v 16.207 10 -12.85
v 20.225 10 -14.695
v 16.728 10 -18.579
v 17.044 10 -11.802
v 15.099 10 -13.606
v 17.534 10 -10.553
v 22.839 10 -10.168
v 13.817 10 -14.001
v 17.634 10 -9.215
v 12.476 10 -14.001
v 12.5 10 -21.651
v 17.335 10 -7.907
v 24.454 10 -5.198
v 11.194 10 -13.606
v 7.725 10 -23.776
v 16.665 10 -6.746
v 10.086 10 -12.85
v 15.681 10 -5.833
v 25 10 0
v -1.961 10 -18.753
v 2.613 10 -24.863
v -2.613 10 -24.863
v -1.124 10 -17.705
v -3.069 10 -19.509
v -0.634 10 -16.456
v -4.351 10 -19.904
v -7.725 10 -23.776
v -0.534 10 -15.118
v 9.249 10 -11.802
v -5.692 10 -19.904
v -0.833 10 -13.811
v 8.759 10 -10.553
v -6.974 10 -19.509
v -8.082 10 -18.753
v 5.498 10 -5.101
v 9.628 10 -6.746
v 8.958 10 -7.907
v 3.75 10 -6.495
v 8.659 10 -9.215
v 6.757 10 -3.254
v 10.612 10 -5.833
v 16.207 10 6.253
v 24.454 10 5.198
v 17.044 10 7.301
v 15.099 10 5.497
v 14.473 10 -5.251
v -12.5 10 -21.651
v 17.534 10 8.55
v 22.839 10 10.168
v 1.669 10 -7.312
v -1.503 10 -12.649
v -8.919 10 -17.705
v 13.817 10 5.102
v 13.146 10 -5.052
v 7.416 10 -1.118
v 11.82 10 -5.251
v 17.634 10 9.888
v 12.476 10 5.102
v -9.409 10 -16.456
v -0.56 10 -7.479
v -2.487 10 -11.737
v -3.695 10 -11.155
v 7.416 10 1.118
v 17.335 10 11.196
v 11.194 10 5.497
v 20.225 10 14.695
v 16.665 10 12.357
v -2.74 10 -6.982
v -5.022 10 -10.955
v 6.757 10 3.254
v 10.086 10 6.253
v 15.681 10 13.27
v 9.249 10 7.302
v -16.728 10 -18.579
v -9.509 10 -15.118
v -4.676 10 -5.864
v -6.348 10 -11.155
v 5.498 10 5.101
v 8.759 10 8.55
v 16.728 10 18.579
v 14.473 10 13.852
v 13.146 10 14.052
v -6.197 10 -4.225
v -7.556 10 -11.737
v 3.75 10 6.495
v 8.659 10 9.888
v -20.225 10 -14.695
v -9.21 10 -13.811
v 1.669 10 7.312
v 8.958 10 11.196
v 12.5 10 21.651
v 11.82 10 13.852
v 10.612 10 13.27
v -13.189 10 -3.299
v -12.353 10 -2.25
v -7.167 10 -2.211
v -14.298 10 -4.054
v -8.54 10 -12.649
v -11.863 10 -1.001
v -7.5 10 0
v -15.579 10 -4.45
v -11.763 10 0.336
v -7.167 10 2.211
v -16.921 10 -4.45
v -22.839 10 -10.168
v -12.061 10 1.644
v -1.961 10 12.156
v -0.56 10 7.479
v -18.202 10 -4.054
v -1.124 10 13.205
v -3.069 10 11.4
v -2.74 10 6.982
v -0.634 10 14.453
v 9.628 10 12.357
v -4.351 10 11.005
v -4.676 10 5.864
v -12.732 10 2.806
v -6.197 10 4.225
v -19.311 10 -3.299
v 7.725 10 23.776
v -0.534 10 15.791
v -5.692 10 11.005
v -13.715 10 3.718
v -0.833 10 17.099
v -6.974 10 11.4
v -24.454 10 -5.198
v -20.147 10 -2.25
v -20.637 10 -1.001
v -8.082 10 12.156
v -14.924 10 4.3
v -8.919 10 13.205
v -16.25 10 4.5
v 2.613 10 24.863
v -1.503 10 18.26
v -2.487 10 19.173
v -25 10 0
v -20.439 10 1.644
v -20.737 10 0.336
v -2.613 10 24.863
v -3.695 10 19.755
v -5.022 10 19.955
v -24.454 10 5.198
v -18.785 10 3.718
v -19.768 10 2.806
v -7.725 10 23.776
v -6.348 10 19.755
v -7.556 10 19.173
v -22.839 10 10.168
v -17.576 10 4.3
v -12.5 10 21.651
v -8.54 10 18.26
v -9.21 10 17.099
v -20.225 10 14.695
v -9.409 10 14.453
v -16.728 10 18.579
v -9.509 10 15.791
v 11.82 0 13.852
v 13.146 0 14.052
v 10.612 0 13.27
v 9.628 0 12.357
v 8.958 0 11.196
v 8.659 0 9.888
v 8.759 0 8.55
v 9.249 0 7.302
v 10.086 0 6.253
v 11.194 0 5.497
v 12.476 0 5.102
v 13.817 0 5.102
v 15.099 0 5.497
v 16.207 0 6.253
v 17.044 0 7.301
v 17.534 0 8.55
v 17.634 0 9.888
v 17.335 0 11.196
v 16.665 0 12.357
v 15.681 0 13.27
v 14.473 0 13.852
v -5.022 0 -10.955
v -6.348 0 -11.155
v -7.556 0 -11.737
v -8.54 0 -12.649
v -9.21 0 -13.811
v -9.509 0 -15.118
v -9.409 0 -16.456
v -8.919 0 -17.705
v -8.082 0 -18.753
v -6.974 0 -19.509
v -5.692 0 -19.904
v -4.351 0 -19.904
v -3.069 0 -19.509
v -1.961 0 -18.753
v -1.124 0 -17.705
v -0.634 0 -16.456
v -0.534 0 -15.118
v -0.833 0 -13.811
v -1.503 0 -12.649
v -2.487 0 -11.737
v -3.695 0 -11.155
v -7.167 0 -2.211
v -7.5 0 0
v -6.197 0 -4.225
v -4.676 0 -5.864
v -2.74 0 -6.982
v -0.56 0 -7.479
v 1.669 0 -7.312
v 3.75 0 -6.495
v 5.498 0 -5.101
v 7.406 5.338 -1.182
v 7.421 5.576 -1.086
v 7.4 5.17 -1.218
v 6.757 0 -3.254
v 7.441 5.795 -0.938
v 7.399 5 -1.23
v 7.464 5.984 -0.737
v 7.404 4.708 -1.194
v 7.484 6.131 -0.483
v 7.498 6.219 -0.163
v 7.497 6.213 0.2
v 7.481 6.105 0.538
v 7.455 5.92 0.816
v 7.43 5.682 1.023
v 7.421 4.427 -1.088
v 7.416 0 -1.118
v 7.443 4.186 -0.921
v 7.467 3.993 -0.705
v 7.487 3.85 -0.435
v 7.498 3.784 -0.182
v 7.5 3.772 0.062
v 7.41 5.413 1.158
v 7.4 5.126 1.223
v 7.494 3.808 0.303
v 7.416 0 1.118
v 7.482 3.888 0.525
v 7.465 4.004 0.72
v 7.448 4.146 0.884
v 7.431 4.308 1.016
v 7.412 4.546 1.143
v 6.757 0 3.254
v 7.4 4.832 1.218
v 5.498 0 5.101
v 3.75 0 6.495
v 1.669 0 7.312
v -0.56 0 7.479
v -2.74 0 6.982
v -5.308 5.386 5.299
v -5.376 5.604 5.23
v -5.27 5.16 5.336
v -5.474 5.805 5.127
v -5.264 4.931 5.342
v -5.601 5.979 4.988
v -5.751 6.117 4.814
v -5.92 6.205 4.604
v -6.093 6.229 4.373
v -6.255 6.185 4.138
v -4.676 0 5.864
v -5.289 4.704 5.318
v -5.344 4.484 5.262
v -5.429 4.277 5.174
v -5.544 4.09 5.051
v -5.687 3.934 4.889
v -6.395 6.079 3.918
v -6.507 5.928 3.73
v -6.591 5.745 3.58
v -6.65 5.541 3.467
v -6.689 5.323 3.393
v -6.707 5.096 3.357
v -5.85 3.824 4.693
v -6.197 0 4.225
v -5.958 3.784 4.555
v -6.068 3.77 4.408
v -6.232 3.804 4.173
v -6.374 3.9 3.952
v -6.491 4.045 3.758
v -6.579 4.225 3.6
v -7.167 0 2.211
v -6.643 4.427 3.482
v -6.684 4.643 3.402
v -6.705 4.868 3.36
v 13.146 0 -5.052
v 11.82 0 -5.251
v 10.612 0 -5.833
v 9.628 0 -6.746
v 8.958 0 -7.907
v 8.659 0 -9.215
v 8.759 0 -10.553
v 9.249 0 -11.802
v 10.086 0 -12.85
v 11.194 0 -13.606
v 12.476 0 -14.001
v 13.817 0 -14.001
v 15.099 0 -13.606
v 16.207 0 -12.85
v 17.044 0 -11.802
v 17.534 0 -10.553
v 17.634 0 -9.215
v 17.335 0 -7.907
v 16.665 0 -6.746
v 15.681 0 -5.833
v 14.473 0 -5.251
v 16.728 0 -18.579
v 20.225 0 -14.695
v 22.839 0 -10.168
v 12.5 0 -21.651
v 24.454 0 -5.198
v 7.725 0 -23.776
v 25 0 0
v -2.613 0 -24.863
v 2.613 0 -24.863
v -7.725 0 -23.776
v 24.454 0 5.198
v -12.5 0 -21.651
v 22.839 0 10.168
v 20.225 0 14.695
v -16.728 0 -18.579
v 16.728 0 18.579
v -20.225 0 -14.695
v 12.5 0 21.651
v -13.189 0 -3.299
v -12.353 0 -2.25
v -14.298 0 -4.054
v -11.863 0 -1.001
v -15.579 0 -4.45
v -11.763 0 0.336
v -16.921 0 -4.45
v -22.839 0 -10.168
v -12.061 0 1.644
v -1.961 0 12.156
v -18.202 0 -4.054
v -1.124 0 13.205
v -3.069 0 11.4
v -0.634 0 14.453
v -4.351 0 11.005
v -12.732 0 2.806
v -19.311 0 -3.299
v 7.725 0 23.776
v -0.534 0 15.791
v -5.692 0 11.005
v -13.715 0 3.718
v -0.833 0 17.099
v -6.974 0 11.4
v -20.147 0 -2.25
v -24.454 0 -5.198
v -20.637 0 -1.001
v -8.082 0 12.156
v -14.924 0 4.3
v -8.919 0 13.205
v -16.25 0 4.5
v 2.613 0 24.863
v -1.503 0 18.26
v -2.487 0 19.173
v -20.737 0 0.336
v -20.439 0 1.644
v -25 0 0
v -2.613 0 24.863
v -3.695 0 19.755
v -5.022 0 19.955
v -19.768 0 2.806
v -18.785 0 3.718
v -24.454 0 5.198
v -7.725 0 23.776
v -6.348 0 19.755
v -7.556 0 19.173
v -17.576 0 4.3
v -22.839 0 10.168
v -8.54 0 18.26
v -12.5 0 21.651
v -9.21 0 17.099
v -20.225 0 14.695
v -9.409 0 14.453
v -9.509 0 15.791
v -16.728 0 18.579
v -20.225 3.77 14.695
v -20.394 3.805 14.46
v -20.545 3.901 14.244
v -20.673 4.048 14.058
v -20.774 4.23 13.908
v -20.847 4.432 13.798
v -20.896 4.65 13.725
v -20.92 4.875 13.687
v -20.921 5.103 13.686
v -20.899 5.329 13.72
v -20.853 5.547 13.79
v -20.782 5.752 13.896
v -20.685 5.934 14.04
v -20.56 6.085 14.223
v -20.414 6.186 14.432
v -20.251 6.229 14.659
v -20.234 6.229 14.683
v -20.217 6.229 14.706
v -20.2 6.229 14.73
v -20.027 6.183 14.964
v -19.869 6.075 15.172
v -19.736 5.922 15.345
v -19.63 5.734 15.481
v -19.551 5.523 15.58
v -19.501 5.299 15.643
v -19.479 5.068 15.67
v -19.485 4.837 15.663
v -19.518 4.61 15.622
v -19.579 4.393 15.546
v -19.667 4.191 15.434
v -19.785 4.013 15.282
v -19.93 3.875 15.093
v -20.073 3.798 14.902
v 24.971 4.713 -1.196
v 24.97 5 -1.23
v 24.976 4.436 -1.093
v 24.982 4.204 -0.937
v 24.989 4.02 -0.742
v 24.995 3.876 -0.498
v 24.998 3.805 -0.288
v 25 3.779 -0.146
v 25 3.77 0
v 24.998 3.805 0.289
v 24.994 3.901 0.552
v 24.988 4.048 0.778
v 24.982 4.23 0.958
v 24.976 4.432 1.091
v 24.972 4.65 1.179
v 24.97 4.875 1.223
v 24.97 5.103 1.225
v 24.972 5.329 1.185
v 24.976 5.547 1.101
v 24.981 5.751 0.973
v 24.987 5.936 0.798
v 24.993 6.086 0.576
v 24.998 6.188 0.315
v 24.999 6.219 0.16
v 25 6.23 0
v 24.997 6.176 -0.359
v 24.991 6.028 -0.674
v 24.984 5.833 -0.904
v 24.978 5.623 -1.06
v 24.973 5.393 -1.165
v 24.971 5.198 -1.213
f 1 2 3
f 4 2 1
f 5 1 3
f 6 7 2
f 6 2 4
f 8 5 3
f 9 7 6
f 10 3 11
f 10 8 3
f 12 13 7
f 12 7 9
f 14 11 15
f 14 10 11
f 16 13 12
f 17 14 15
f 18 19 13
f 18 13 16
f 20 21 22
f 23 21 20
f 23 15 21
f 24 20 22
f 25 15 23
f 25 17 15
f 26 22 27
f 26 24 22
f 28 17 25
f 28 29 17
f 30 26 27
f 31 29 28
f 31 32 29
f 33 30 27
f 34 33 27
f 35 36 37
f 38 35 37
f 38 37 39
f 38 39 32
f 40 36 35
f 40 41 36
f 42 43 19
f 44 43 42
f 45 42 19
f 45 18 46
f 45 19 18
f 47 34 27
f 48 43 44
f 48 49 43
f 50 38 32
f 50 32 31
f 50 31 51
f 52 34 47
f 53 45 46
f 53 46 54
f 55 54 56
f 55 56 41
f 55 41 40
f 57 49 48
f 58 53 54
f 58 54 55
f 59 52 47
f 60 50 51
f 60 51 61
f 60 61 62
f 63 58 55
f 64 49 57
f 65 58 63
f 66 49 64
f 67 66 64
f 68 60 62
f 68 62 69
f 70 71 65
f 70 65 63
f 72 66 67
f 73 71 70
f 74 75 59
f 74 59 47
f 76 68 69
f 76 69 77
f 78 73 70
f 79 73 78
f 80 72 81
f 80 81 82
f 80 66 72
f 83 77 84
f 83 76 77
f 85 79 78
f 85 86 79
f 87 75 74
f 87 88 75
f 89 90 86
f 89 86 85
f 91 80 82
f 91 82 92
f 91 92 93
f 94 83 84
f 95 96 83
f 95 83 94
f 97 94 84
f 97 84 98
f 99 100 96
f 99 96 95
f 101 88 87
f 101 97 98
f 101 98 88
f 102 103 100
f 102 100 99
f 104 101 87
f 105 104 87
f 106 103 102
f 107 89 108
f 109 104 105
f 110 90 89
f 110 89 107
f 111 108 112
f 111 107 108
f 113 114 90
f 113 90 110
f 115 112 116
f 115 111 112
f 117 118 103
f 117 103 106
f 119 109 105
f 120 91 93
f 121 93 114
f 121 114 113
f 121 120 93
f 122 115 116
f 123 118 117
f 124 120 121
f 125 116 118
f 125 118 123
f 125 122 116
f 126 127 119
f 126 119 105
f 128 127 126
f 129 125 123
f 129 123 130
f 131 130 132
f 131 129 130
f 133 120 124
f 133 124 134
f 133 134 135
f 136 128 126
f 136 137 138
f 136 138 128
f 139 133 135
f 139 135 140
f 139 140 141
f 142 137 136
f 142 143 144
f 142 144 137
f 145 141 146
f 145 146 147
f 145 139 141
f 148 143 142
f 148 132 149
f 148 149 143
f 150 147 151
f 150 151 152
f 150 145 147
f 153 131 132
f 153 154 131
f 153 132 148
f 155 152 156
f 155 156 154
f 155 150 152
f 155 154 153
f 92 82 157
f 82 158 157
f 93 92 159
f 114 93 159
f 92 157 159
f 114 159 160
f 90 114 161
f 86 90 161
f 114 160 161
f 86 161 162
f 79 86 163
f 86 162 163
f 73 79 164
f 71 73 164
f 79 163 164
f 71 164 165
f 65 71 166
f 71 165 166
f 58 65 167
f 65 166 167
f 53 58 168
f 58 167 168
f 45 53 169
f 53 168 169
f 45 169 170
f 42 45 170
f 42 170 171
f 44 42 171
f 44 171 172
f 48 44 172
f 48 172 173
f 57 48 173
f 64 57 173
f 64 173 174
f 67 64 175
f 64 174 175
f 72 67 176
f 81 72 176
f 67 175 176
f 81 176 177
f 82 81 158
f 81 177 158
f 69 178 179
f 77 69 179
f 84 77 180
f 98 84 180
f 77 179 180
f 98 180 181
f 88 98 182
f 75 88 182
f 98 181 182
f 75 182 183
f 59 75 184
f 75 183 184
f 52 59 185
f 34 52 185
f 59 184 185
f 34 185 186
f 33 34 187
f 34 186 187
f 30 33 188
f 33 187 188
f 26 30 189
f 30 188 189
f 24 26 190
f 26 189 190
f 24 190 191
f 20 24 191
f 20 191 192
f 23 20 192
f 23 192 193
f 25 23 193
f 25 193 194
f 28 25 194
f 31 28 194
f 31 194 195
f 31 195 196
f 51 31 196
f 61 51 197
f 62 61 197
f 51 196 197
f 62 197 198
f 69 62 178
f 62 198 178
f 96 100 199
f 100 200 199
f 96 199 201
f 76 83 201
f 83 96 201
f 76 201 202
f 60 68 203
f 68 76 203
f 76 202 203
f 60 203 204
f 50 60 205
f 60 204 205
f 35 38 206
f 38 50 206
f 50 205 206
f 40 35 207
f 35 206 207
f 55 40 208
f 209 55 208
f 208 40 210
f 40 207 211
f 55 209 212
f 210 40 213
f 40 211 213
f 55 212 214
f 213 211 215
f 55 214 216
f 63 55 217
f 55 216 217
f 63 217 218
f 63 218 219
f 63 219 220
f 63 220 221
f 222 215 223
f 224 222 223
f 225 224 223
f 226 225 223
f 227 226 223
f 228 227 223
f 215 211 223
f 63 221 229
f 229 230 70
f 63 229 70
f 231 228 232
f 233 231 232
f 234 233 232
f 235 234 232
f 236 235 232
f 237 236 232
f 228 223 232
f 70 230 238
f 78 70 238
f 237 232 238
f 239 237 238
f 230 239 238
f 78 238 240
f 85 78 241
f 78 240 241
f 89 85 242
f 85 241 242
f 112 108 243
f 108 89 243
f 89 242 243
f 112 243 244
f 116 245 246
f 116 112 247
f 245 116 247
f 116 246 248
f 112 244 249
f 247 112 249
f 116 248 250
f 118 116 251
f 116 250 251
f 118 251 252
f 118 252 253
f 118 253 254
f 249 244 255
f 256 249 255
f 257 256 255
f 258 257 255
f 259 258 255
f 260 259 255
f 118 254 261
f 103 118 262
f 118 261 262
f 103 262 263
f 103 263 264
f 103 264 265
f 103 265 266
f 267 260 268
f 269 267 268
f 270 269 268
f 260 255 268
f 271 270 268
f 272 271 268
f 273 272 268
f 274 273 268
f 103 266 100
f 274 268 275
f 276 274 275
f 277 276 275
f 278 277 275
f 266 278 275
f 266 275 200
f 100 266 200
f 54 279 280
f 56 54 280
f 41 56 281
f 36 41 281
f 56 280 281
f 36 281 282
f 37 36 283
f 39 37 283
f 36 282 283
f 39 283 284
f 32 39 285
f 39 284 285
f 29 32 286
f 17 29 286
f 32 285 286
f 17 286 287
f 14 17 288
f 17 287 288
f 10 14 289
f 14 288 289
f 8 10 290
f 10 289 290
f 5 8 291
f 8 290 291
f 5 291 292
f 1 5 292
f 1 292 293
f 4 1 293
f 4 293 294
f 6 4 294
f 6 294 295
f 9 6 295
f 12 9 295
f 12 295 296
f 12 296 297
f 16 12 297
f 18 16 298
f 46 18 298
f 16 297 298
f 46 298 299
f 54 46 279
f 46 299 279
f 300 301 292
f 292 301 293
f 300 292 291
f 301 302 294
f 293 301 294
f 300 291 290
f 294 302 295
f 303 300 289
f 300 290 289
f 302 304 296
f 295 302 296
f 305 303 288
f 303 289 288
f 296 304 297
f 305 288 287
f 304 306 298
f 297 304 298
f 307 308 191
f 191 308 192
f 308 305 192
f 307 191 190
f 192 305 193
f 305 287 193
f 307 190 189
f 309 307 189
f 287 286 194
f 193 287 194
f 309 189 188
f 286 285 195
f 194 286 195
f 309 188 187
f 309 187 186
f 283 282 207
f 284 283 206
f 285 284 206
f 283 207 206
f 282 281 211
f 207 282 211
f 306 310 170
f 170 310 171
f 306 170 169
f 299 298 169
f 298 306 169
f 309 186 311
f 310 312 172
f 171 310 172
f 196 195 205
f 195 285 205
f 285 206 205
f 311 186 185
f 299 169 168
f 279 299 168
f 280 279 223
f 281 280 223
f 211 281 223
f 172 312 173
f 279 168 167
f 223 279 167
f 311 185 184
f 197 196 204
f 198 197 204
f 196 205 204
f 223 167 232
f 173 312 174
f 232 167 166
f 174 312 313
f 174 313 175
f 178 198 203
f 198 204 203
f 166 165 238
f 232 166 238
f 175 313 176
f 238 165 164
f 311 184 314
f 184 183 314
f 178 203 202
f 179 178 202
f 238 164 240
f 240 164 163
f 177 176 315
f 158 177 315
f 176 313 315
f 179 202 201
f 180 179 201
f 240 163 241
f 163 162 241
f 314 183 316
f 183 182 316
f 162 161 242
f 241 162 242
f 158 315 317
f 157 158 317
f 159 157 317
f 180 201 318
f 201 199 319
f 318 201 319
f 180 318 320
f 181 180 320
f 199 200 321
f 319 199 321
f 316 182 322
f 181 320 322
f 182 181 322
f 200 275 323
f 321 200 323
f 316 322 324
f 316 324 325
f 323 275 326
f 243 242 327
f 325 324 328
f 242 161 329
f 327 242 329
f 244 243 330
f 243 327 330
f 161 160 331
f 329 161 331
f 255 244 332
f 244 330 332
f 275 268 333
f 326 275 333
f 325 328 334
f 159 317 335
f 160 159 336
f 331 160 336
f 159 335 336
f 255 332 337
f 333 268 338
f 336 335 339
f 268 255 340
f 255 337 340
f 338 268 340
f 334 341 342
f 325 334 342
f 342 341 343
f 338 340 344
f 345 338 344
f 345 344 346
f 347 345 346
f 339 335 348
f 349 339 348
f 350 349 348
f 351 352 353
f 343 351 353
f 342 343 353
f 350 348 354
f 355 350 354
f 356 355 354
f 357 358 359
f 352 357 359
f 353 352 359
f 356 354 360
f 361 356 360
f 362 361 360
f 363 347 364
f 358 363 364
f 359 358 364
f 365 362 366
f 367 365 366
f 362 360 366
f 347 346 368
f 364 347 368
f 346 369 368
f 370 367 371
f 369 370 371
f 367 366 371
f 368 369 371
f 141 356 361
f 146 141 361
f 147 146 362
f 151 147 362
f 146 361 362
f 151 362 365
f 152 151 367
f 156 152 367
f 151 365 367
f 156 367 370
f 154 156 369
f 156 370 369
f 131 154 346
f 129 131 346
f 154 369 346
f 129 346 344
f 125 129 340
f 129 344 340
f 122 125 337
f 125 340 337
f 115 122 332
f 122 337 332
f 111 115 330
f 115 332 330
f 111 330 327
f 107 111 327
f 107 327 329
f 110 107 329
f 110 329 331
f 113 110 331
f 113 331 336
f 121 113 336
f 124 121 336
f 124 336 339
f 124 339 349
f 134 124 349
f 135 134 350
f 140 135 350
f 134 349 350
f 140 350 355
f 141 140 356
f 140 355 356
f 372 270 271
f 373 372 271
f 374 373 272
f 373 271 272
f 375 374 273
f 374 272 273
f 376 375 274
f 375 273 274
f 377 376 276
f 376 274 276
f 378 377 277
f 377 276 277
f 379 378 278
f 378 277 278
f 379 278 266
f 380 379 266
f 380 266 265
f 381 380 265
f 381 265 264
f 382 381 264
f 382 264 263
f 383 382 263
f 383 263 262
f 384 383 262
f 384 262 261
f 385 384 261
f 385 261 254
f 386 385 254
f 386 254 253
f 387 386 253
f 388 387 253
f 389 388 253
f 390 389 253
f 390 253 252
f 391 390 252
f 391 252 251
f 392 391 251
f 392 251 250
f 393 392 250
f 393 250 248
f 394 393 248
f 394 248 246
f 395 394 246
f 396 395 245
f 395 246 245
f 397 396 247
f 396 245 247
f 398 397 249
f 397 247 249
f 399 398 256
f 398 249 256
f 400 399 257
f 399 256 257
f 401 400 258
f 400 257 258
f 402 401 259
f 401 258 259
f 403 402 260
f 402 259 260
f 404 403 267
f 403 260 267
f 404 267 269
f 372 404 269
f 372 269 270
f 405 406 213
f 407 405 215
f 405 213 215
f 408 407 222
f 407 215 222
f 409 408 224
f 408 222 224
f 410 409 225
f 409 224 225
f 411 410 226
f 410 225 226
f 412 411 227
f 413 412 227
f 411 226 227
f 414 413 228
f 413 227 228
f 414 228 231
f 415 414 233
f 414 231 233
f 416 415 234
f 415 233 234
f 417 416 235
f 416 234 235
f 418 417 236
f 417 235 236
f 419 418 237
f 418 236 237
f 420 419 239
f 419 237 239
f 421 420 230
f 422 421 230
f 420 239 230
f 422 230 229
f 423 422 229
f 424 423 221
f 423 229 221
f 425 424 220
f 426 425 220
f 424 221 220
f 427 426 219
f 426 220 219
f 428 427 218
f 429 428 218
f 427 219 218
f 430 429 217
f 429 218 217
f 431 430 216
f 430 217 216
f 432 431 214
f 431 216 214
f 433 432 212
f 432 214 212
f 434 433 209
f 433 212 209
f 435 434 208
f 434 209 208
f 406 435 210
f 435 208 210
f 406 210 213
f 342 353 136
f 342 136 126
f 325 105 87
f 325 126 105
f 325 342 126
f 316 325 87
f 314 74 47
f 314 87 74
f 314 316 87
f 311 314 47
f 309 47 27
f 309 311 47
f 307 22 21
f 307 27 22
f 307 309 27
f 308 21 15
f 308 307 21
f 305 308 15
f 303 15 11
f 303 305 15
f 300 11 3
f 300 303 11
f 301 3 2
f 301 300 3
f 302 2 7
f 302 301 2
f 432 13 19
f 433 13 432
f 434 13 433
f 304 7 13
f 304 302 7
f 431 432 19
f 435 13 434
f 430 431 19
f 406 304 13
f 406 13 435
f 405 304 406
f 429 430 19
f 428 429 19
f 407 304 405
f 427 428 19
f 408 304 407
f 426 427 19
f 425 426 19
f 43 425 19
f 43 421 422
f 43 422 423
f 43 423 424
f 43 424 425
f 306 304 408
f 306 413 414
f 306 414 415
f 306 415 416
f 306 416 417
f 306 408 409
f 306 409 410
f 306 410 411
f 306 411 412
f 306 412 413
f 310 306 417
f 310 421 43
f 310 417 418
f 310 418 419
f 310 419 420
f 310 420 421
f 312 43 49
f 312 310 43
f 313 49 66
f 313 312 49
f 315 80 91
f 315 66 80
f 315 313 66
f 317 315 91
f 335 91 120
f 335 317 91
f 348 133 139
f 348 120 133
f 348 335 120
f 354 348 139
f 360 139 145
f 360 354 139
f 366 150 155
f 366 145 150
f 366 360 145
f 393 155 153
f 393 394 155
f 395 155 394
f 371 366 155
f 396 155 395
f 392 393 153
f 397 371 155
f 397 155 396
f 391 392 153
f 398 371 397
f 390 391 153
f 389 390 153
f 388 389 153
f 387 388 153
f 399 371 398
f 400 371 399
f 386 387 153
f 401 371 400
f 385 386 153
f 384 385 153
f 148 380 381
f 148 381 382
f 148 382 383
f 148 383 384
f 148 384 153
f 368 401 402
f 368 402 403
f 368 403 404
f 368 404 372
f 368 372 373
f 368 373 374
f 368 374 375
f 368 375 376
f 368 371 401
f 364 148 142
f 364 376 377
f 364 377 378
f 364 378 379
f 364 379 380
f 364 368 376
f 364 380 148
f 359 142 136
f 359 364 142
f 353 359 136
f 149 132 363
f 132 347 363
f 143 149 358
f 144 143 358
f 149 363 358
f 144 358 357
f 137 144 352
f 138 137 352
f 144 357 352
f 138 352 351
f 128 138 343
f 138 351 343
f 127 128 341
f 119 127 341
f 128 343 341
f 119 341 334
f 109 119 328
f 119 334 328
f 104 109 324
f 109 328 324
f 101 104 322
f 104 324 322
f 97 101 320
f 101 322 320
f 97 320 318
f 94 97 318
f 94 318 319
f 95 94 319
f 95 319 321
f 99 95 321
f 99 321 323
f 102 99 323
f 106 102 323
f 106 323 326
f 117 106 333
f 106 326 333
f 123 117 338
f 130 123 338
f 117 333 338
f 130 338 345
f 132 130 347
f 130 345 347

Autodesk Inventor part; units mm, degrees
ref_plane "YZ Plane" through (0, 0, 0) normal (1, 0, 0) x (0, 1, 0)
sketch "Skizze1" plane through (0, 0, 0) normal (0, 1, 0) x (-1, 0, 0)
  circle A0 centre (0, 0) radius 7.5
  circle A1 centre (0, 0) radius 25
  dimension "d0" = 15
  dimension "d1" = 50
extrude "Extrusion1" add sketch "Skizze1" along normal blind 10
sketch "Skizze2" plane through (0, 10, 0) normal (0, 1, 0) x (1, 0, 0)
  circle A0 centre (0, 0) radius 25 projected
  line L0 (-25, 0) -> (-16.25, 0)
  line L1 (0, 0) -> (8.75, 0) construction
  line L2 (0, 0) -> (-5.0215, 15.4547)
  line L3 (0, 0) -> (16.25, 0) construction
  line L4 (0, 0) -> (13.1465, 9.5515)
  line L5 (0, 0) -> (16.25, 0) construction
  line L6 (0, 0) -> (16.25, 0) construction
  line L7 (0, 0) -> (13.1465, -9.5515)
  line L8 (0, 0) -> (16.25, 0) construction
  line L9 (0, 0) -> (-5.0215, -15.4547)
  line L10 (0, 0) -> (16.25, 0) construction
  circle A1 centre (-16.25, 0) radius 4.3
  circle A2 centre (-5.0215, 15.4547) radius 4.3
  circle A3 centre (13.1465, 9.5515) radius 4.3
  circle A4 centre (13.1465, -9.5515) radius 4.3
  circle A5 centre (-5.0215, -15.4547) radius 4.3
  dimension "d4" = 8.75
  dimension "d9" = 16.25
  dimension "d10" = 108
  dimension "d11" = 16.25
  dimension "d12" = 36
  dimension "d15" = 16.25
  dimension "d16" = 36
  dimension "d17" = 16.25
  dimension "d18" = 108
  dimension "d19" = 8.6
  dimension "d20" = 8.6
  dimension "d21" = 8.6
  dimension "d22" = 8.6
  dimension "d23" = 8.6
hole "Bohrung1" at (-16.25, 10, 0) at (-5.0215, 10, -15.4547) at (13.1465, 10, -9.5515) at (13.1465, 10, 9.5515) at (-5.0215, 10, 15.4547) direction (0, -1, 0) diameter 9 end through all
sketch "Skizze3" plane through (0, 0, 0) normal (1, 0, 0) x (0, 1, 0)
  point P0 (0, 0)
sketch "Skizze4" plane through (0, 0, 0) normal (1, 0, 0) x (0, 1, 0)
  line L0 (0, 0) -> (5, 0)
sketch "Skizze6" plane through (0, 10, 0) normal (0, 1, 0) x (1, 0, 0)
  circle A0 centre (-5.0215, -15.4547) radius 4.5 projected
  circle A1 centre (-16.25, 0) radius 4.5 projected
  circle A2 centre (0, 0) radius 25 projected
  line L0 (0, 0) -> (-8.7488, -12.9333)
  line L1 (0, 0) -> (-15.0038, -4.324)
  line L2 (-11.8428, -8.6043) -> (-20.2254, -14.6946)
  line L3 (-11.8428, -8.6043) -> (-1.4813, -8.6043) construction
  line L4 (0, 0) -> (-11.8428, -8.6043)
  dimension "d36" = 5.321
  dimension "d37" = 144
sketch "Skizze7" plane through (0, 0, 0) normal (0, -1, 0) x (1, 0, 0)
  line L0 (0, 0) -> (-20.2254, 14.6946)
  circle A0 centre (0, 0) radius 25 projected
  line L1 (0, 0) -> (25, 0) construction
  line L2 (-20.2254, 14.6946) -> (44.6167, -28.5072)
  dimension "d38" = 144
ref_plane "Arbeitsebene1" through (-20.2254, 10, 14.6946) normal (-0.809017, 0, 0.5877853) x (0, -1, 0)
sketch "Skizze8" plane through (-20.2254, 10, 14.6946) normal (-0.809017, 0, 0.5877853) x (0, -1, 0)
  line L0 (10, 0) -> (5, 0)
  dimension "d39" = 5
hole "Bohrung2" at (-20.2254, 5, 14.6946) direction (0.809017, 0, -0.5877853) diameter 2.459 depth 27.8 tip angle 118 thread size "M3x0.5" class "6H" standard "ISO Metric profile"
sketch "Skizze9" plane through (0, 0, 0) normal (0, -1, 0) x (1, 0, 0)
  line L0 (0, 0) -> (25, 0)
  circle A0 centre (0, 0) radius 25 projected
  line L1 (0, 0) -> (14.68, 5.3208)
  circle A1 centre (13.1465, 9.5515) radius 4.5 projected
  line L2 (0, 0) -> (14.68, -5.3208)
  circle A2 centre (13.1465, -9.5515) radius 4.5 projected
  line L3 (0, 0) -> (25, 0)
sketch "Skizze10" plane through (0, 10, 0) normal (0, 1, 0) x (1, 0, 0)
  line L0 (0, 0) -> (25, 0)
  circle A0 centre (0, 0) radius 25 projected
ref_plane "Arbeitsebene2" through (25, 0, 0) normal (1, 0, 0) x (0, 1, 0)
sketch "Skizze11" plane through (25, 0, 0) normal (1, 0, 0) x (0, 1, 0)
  line L0 (0, 0) -> (5, 0)
  dimension "d47" = 5
hole "Bohrung3" at (25, 5, 0) direction (-1, 0, 0) diameter 2.459 depth 27.8 tip angle 118 thread size "M3x0.5" class "6H" standard "ISO Metric profile"
properties part number "Flansch" material "Aluminium 6061"
